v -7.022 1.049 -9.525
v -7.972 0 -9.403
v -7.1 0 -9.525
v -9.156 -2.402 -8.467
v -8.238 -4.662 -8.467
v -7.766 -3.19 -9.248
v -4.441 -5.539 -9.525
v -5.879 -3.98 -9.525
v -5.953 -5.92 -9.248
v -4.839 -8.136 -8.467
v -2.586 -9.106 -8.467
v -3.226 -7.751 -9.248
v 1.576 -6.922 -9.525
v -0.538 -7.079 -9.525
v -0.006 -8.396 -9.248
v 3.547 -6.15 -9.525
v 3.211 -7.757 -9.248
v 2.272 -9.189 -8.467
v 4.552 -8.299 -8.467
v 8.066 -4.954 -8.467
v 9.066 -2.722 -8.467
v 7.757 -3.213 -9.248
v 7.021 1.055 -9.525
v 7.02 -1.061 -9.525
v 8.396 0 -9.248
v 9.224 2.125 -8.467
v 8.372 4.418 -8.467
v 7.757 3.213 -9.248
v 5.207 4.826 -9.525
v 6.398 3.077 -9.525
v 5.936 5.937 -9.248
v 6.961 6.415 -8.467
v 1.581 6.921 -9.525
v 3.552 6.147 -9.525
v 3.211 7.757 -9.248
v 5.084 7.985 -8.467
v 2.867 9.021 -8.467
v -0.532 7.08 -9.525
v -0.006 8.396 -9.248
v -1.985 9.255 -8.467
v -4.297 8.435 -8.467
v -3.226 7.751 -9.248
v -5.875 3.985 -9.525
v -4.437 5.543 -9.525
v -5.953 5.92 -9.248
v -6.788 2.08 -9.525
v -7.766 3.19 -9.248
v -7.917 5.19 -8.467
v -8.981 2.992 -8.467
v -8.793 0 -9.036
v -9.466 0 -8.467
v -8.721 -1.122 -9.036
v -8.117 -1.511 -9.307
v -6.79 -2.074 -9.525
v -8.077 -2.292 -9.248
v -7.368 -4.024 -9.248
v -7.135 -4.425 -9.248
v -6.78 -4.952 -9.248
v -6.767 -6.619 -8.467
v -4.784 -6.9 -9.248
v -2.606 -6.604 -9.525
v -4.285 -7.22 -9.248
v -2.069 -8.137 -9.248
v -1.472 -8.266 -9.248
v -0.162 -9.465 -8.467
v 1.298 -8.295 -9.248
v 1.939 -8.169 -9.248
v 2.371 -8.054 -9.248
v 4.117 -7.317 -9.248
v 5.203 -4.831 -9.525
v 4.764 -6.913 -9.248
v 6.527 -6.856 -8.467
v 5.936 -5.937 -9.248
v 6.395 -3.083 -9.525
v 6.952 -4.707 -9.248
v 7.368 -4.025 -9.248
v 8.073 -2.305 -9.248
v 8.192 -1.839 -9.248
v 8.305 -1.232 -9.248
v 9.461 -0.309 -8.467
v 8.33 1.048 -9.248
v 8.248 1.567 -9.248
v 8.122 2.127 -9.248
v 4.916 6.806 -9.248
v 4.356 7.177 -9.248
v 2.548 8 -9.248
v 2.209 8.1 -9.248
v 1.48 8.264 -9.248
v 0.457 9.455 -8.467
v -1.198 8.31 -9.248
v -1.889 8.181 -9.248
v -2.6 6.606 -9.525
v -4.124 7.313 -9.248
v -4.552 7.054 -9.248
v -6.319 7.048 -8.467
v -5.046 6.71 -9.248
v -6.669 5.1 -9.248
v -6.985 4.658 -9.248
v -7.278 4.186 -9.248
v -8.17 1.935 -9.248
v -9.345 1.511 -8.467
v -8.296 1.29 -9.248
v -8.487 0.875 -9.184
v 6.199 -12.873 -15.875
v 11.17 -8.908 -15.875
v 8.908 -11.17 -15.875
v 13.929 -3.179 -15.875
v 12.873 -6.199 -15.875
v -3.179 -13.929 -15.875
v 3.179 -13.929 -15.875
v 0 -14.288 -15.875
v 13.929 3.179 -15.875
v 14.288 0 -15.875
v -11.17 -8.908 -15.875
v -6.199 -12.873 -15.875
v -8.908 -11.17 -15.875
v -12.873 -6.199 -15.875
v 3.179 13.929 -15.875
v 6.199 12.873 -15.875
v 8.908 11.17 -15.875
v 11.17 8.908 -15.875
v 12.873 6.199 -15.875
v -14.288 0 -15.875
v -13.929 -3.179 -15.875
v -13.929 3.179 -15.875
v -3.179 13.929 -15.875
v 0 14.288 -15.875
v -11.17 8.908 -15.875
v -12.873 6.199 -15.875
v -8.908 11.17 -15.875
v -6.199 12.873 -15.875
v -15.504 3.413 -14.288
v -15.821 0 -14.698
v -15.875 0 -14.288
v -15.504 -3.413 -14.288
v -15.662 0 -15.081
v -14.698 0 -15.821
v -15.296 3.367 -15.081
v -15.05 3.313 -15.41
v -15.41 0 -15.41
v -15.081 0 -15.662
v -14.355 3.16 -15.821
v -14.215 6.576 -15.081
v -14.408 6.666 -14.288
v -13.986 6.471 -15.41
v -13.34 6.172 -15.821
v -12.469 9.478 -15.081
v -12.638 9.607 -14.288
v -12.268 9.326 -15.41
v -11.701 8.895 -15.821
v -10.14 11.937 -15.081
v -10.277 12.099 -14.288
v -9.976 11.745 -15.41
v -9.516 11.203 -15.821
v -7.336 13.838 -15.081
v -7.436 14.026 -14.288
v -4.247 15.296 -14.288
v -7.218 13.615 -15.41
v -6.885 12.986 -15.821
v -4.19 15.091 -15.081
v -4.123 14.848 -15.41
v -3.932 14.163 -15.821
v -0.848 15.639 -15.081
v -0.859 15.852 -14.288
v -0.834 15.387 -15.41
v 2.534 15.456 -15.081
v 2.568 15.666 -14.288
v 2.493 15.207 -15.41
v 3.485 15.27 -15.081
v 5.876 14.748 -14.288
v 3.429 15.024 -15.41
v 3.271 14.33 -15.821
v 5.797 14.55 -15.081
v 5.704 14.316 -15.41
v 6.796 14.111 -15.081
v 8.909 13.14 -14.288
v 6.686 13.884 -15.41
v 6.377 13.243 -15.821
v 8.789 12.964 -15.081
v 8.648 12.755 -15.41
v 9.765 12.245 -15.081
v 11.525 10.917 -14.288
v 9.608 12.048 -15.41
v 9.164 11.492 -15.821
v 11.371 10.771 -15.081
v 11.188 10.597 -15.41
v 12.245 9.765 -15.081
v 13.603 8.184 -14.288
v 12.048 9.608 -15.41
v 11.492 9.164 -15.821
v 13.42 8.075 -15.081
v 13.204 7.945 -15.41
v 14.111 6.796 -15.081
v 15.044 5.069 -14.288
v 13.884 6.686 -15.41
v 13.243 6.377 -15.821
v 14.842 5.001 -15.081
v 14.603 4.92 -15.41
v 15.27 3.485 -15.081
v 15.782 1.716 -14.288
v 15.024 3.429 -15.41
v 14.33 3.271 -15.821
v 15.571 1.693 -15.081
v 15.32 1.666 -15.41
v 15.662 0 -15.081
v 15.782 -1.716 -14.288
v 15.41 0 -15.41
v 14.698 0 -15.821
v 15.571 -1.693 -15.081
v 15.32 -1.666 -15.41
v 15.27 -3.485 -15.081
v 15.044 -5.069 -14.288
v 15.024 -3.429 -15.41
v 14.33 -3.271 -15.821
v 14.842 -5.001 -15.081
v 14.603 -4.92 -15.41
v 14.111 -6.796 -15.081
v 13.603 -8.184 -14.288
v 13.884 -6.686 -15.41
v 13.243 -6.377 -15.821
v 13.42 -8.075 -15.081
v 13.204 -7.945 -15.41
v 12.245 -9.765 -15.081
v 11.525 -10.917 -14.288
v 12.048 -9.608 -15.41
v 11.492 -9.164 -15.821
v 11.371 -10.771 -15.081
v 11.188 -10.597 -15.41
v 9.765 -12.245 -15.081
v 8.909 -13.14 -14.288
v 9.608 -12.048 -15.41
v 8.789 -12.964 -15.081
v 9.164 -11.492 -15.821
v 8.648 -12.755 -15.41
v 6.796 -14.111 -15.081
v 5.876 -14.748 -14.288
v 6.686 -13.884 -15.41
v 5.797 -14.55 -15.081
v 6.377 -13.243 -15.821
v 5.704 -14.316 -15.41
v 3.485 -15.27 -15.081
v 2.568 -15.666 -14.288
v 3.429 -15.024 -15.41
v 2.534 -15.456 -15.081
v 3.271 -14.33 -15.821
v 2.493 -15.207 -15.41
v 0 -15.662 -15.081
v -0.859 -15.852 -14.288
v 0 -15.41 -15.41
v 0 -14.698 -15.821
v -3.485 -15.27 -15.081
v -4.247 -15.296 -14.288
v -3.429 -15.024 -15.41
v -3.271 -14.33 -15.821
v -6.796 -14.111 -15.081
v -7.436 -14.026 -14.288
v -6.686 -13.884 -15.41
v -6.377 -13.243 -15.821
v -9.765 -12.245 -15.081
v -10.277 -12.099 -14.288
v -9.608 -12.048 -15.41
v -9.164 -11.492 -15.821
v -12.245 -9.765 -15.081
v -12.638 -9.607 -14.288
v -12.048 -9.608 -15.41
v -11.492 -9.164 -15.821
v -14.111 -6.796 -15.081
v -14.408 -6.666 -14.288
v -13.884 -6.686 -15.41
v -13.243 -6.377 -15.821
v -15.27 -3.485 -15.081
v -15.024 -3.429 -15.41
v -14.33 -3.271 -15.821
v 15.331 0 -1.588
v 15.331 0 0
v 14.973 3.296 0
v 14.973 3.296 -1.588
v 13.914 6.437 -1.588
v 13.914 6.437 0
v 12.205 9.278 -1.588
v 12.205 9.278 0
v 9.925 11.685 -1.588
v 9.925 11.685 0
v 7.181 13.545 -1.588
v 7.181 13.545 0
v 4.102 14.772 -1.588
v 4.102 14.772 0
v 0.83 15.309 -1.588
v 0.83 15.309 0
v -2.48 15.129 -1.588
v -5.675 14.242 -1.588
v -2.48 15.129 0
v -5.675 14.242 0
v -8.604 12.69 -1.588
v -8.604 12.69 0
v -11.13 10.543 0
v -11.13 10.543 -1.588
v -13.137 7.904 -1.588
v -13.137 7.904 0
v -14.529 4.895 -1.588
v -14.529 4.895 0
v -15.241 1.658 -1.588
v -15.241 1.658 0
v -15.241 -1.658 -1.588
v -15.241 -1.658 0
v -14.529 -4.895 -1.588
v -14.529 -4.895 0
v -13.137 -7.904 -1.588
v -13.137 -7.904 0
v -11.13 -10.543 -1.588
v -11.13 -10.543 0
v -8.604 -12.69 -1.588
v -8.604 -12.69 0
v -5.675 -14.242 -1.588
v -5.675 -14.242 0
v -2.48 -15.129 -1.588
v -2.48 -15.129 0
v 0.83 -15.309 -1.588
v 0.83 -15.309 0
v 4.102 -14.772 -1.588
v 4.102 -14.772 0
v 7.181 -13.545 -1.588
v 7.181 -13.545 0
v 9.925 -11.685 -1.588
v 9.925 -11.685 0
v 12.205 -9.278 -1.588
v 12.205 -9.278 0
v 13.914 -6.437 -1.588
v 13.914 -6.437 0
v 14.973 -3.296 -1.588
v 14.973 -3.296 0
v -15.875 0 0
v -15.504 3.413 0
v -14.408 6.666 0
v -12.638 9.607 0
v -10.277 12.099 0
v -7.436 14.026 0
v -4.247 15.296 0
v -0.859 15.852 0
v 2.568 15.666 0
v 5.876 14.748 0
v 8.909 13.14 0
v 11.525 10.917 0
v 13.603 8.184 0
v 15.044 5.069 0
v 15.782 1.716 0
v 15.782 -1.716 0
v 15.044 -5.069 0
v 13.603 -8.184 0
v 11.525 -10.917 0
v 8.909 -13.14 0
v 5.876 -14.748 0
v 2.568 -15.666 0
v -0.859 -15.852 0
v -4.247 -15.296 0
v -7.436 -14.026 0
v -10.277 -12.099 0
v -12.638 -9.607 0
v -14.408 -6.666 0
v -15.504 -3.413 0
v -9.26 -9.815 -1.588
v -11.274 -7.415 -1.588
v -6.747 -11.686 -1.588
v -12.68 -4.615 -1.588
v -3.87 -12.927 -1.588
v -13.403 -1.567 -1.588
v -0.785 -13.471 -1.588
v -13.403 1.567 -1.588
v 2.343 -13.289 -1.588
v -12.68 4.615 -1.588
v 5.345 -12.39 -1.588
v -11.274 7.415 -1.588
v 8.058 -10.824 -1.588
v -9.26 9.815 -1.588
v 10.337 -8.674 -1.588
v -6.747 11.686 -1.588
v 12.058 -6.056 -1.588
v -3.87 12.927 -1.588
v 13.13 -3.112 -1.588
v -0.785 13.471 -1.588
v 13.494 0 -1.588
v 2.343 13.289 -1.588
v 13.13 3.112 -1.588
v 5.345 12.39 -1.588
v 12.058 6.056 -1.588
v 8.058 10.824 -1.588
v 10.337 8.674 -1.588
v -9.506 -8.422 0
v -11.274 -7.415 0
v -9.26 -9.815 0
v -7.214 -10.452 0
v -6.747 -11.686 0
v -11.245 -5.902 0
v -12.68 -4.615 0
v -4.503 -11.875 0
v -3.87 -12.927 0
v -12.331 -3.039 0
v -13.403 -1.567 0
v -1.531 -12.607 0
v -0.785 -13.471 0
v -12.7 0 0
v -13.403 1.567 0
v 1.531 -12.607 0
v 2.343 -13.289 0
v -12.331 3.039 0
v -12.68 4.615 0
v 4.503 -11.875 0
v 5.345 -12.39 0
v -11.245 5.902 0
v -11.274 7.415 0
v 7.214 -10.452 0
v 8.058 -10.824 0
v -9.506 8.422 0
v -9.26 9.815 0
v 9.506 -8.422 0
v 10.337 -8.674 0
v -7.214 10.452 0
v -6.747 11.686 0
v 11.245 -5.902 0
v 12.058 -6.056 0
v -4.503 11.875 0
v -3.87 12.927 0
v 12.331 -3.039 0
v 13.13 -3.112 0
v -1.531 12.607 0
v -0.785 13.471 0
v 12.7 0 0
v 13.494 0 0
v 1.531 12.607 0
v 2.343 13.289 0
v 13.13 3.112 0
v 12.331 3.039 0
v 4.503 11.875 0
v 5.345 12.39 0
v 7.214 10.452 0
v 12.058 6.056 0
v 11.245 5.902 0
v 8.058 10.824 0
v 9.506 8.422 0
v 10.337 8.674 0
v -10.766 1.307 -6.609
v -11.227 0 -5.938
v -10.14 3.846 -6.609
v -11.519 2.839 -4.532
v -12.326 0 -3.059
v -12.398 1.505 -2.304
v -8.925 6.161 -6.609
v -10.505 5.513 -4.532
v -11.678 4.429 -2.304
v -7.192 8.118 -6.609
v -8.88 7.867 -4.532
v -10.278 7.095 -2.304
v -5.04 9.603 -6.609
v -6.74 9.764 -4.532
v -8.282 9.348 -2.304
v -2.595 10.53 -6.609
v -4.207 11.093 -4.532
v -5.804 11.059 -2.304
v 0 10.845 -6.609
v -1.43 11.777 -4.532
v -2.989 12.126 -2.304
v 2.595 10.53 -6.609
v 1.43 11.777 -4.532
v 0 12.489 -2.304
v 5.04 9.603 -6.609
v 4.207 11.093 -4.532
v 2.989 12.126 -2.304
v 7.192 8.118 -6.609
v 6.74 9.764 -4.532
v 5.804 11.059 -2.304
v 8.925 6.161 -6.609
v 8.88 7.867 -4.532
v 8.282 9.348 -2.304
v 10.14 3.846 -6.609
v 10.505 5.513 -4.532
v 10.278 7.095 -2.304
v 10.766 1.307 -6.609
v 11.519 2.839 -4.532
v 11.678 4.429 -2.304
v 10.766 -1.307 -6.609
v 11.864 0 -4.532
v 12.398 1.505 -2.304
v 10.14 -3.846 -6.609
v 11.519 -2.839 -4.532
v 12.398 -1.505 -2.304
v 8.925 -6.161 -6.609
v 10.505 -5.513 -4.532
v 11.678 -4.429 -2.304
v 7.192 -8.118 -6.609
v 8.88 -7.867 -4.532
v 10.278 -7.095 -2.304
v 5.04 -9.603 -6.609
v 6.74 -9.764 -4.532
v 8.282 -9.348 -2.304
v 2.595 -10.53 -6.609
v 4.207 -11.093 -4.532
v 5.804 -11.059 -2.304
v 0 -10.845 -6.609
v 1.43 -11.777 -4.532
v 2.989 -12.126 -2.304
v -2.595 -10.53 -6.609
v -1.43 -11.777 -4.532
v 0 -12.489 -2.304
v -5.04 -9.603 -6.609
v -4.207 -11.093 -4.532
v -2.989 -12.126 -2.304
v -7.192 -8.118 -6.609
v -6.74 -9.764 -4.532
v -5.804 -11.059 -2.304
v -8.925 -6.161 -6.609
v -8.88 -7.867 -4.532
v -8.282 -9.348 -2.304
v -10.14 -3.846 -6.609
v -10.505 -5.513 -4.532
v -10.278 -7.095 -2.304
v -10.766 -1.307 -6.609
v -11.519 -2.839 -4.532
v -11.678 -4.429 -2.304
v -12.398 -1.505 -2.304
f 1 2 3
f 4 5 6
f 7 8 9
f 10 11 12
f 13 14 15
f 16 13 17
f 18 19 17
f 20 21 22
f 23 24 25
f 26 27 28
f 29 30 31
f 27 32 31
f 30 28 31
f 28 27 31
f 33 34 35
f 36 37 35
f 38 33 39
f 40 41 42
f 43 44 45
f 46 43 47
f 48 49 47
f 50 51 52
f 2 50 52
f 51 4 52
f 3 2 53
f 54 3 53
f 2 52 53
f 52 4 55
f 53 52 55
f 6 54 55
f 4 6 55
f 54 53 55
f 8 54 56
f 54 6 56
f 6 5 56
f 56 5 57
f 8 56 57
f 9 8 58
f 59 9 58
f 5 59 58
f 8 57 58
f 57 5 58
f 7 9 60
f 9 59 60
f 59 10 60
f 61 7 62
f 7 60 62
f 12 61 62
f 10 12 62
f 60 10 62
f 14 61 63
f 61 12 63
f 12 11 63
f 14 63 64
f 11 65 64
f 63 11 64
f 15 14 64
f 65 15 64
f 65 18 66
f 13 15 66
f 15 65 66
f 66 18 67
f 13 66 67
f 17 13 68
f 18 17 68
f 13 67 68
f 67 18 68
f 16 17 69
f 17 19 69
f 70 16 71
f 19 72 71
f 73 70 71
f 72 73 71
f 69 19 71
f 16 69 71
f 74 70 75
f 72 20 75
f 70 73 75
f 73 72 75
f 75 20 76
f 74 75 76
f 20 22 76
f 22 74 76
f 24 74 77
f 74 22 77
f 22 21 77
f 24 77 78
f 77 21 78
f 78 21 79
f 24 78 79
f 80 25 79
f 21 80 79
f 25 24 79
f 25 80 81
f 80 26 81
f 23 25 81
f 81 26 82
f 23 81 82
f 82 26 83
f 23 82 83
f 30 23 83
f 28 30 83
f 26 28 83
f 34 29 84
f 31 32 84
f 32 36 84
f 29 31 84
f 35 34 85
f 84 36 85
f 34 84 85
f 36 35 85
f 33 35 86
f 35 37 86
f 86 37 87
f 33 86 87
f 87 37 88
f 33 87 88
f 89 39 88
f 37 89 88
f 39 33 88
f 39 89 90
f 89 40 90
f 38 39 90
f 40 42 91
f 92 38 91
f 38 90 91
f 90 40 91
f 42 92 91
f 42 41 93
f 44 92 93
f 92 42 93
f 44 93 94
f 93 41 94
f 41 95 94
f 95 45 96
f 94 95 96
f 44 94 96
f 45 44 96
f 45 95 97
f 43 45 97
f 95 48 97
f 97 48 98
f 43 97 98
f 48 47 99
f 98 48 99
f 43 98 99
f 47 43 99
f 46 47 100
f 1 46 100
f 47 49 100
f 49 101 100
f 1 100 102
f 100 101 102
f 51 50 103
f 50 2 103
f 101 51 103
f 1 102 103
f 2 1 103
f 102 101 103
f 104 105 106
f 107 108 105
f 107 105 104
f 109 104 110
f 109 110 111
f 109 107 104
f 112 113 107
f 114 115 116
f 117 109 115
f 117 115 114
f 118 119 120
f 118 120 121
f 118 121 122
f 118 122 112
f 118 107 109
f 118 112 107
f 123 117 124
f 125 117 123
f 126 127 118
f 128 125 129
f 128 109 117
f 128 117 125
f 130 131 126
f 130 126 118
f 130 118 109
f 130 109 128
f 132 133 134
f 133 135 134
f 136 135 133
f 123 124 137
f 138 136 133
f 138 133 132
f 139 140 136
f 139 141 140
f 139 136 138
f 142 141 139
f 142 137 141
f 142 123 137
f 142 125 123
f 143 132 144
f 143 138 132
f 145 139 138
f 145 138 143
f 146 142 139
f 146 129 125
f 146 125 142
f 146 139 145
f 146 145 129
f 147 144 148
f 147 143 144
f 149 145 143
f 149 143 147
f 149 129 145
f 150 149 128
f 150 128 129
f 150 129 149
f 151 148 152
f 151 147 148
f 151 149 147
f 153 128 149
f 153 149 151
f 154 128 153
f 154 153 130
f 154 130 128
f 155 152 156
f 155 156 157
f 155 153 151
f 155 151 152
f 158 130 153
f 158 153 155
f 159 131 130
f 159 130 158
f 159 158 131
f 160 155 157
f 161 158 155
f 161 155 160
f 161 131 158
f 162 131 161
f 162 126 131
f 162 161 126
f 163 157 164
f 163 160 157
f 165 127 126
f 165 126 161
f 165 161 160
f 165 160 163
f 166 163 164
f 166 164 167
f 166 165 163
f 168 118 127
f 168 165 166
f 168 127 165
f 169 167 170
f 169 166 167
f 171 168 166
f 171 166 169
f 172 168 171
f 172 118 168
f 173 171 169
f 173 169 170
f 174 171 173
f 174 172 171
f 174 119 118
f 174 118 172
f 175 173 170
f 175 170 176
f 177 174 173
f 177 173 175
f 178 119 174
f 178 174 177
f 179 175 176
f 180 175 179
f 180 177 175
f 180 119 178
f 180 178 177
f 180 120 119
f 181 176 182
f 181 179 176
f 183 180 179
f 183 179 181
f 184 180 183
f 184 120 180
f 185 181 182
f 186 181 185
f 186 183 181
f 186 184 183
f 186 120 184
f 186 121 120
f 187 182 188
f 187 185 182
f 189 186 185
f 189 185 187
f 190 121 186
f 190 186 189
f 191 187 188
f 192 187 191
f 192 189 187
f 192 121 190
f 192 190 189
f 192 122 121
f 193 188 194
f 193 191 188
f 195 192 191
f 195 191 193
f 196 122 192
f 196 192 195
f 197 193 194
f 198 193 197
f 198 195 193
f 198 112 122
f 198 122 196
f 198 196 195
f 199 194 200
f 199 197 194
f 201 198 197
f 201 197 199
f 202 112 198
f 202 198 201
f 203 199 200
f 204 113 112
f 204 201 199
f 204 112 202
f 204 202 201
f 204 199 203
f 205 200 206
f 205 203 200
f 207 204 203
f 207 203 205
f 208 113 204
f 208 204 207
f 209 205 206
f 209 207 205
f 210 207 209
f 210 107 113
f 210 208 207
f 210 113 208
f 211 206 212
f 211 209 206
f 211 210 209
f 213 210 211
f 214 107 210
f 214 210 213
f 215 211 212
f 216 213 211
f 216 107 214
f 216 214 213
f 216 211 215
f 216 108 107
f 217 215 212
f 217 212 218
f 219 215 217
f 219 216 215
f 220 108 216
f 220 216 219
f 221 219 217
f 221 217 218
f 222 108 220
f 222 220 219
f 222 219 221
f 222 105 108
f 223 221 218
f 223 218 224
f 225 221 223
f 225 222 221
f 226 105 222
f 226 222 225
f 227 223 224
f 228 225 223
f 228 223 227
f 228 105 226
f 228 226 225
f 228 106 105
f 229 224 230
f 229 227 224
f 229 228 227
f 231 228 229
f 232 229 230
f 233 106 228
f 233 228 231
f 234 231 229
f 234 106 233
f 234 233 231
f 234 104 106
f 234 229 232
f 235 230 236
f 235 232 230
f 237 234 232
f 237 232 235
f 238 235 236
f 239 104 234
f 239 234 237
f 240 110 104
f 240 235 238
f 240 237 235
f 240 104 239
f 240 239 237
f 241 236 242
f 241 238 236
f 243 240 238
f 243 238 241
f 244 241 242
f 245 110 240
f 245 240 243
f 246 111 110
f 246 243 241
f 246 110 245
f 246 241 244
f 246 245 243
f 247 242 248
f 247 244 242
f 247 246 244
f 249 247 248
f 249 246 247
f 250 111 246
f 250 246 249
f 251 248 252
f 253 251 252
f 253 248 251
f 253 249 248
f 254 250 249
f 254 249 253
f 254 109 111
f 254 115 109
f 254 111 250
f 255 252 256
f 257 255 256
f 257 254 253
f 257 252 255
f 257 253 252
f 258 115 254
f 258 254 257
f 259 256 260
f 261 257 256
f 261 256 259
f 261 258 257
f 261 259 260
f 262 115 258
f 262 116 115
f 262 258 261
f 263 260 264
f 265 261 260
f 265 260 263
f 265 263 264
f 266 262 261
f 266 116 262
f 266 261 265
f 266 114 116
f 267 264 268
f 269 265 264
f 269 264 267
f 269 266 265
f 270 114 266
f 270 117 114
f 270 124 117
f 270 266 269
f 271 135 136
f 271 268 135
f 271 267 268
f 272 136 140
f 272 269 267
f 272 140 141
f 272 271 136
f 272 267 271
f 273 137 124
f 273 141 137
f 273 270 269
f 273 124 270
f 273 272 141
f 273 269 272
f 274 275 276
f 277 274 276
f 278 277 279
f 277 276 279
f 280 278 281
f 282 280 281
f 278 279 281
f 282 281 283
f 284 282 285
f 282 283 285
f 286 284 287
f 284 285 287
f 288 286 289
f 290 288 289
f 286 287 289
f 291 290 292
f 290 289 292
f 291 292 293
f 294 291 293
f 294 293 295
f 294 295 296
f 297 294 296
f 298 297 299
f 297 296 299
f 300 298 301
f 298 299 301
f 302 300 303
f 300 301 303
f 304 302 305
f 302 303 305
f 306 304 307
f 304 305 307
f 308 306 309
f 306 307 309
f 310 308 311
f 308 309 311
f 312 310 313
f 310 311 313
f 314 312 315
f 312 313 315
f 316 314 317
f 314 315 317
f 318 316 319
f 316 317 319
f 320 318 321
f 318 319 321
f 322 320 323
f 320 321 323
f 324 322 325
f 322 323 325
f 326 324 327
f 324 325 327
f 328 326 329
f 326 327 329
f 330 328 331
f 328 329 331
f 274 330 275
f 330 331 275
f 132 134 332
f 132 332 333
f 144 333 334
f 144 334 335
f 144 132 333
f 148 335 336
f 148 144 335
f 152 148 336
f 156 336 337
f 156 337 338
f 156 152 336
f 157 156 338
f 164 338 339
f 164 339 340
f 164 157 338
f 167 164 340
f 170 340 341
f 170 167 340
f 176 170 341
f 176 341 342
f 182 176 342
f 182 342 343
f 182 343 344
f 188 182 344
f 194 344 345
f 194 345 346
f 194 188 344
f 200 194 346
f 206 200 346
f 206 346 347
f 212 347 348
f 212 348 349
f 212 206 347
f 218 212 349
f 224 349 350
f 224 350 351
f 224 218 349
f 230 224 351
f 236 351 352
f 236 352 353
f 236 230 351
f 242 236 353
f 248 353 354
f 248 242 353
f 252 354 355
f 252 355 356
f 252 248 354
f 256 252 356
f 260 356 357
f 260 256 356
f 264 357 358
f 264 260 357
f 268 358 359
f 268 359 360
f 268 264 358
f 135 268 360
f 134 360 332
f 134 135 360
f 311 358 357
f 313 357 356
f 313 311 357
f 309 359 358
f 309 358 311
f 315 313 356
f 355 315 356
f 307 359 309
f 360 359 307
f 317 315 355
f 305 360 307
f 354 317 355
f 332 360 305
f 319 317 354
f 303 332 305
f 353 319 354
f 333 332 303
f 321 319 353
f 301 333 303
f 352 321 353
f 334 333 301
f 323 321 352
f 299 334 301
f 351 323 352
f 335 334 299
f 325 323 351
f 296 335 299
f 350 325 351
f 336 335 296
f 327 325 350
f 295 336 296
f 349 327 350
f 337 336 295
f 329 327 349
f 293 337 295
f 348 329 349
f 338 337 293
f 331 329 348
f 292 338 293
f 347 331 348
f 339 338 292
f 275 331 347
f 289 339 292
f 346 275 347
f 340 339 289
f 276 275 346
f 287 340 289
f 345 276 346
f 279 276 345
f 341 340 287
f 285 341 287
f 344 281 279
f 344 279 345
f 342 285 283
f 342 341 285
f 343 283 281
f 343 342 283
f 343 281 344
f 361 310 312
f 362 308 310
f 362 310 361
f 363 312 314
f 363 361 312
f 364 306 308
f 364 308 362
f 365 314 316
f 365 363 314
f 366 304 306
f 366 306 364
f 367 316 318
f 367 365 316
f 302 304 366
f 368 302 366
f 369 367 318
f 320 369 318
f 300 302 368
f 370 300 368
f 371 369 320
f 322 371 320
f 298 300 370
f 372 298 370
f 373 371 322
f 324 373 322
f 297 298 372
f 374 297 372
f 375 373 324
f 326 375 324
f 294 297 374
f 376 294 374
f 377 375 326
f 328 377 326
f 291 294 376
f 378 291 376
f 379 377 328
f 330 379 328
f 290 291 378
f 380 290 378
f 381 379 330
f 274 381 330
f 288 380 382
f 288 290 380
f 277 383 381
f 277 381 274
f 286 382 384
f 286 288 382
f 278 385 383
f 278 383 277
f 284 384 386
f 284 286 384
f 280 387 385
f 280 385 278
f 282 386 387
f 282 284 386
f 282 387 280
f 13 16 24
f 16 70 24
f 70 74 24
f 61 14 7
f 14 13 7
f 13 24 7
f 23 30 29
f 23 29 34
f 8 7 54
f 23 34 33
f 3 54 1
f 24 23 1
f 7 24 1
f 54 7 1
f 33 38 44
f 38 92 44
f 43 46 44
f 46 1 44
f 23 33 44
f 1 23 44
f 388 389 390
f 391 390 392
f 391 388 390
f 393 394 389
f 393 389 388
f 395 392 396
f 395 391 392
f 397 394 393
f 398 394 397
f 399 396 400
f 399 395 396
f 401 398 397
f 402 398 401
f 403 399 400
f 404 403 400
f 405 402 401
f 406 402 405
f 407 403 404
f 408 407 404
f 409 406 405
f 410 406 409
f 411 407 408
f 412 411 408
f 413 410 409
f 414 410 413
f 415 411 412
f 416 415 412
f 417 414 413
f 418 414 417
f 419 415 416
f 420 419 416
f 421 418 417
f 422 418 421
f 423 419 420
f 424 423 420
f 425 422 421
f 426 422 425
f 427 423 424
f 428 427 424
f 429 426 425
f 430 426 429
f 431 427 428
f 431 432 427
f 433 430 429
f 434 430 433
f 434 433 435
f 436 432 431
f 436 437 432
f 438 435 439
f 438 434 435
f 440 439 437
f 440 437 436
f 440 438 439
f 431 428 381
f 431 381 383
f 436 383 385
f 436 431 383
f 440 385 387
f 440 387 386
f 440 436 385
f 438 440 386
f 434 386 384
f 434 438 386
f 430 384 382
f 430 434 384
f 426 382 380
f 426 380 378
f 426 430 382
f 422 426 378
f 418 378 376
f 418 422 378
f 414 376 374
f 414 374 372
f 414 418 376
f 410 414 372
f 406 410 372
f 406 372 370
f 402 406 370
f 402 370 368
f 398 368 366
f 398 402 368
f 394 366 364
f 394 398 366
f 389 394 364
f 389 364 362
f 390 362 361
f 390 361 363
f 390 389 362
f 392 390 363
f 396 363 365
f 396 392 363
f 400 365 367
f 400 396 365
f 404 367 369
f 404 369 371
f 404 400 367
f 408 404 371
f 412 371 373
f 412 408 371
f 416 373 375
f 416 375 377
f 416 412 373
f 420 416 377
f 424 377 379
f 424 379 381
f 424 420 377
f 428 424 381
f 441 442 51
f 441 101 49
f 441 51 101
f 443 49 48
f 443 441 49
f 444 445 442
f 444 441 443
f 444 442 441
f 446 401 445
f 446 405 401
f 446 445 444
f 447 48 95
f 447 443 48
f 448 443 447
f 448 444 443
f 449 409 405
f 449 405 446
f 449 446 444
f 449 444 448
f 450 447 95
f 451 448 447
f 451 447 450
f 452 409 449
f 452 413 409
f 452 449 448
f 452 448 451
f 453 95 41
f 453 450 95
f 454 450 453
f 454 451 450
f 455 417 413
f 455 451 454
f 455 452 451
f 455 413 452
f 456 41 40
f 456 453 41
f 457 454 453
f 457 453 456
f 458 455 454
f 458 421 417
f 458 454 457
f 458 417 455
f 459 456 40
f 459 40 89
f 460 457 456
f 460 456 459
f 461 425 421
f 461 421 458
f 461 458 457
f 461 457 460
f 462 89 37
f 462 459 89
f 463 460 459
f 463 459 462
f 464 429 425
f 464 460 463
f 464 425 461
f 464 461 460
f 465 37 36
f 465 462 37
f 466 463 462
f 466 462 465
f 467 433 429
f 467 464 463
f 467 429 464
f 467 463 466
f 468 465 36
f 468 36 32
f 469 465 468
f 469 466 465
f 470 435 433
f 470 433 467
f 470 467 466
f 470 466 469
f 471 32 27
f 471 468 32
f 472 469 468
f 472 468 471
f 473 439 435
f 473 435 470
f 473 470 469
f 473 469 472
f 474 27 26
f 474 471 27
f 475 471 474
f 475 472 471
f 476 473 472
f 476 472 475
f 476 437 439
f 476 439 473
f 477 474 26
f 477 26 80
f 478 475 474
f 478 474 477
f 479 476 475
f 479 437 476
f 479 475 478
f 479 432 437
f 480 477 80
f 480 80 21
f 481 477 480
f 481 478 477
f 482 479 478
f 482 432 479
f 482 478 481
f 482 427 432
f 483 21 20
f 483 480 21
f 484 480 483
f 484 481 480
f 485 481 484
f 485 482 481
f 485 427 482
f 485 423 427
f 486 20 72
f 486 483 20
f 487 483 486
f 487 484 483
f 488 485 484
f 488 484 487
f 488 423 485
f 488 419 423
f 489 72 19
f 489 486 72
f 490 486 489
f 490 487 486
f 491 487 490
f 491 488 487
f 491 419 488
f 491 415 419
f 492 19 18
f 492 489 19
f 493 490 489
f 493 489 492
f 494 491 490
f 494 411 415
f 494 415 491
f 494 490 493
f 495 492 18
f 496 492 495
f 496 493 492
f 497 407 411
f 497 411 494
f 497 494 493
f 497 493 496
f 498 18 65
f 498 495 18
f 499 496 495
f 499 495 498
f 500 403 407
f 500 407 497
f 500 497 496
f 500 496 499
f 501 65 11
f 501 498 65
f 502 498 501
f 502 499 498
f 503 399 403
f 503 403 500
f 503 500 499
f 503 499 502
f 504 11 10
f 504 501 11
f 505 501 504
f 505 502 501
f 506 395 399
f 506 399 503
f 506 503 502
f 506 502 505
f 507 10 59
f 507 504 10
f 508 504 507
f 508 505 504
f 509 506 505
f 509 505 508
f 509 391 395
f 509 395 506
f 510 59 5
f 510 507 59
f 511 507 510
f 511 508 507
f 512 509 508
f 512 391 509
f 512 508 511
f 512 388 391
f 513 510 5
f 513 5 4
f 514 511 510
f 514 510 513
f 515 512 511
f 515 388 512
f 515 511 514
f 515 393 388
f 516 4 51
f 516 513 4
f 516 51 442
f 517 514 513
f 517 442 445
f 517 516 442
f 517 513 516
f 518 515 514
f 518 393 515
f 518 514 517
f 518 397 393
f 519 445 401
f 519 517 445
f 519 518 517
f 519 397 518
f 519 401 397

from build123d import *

# Parameters (mm, degrees)
F2_DEPTH = 6.35
F3_R     = 3.175
F4_R     = 15.33125
F4_R_2   = 13.49375
F5_DEPTH = 1.5875
F6_R     = 1.5875


with BuildPart() as f1:
    # F0 (on Front) → F1 (revolve)
    with BuildSketch(Plane.XZ):
        with BuildLine():
            Line((0, -15.875), (0, -12.7))
            ThreePointArc((0, -12.7), (-8.9802561211, -8.9802561211), (-12.7, 0))
            Line((-12.7, 0), (-15.875, 0))
            Line((-15.875, 0), (-15.875, -15.875))
            Line((-15.875, -15.875), (0, -15.875))
        make_face()
    revolve(axis=Axis((0, 0, -1.4379415661), (0, 0, -1)))

    # F2 (add): a face of the model
    f2_faces = [f1.faces().sort_by_distance(p)[0] for p in [
        (0, 0, -15.875),
    ]]
    extrude(f2_faces, amount=-F2_DEPTH)

    # F3
    f3_edges = [f1.edges().sort_by_distance(p)[0] for p in [
        (8.40026, 0, -9.525),
    ]]
    fillet(f3_edges, radius=F3_R)

    # F4 (on face) → F5 (cut)
    with BuildSketch(Plane.XY):
        Circle(F4_R)
        Circle(F4_R_2, mode=Mode.SUBTRACT)
    extrude(amount=-F5_DEPTH, mode=Mode.SUBTRACT)

    # F6
    f6_edges = [f1.edges().sort_by_distance(p)[0] for p in [
        (15.875, 0, -15.875),
    ]]
    fillet(f6_edges, radius=F6_R)


solid = f1.part
